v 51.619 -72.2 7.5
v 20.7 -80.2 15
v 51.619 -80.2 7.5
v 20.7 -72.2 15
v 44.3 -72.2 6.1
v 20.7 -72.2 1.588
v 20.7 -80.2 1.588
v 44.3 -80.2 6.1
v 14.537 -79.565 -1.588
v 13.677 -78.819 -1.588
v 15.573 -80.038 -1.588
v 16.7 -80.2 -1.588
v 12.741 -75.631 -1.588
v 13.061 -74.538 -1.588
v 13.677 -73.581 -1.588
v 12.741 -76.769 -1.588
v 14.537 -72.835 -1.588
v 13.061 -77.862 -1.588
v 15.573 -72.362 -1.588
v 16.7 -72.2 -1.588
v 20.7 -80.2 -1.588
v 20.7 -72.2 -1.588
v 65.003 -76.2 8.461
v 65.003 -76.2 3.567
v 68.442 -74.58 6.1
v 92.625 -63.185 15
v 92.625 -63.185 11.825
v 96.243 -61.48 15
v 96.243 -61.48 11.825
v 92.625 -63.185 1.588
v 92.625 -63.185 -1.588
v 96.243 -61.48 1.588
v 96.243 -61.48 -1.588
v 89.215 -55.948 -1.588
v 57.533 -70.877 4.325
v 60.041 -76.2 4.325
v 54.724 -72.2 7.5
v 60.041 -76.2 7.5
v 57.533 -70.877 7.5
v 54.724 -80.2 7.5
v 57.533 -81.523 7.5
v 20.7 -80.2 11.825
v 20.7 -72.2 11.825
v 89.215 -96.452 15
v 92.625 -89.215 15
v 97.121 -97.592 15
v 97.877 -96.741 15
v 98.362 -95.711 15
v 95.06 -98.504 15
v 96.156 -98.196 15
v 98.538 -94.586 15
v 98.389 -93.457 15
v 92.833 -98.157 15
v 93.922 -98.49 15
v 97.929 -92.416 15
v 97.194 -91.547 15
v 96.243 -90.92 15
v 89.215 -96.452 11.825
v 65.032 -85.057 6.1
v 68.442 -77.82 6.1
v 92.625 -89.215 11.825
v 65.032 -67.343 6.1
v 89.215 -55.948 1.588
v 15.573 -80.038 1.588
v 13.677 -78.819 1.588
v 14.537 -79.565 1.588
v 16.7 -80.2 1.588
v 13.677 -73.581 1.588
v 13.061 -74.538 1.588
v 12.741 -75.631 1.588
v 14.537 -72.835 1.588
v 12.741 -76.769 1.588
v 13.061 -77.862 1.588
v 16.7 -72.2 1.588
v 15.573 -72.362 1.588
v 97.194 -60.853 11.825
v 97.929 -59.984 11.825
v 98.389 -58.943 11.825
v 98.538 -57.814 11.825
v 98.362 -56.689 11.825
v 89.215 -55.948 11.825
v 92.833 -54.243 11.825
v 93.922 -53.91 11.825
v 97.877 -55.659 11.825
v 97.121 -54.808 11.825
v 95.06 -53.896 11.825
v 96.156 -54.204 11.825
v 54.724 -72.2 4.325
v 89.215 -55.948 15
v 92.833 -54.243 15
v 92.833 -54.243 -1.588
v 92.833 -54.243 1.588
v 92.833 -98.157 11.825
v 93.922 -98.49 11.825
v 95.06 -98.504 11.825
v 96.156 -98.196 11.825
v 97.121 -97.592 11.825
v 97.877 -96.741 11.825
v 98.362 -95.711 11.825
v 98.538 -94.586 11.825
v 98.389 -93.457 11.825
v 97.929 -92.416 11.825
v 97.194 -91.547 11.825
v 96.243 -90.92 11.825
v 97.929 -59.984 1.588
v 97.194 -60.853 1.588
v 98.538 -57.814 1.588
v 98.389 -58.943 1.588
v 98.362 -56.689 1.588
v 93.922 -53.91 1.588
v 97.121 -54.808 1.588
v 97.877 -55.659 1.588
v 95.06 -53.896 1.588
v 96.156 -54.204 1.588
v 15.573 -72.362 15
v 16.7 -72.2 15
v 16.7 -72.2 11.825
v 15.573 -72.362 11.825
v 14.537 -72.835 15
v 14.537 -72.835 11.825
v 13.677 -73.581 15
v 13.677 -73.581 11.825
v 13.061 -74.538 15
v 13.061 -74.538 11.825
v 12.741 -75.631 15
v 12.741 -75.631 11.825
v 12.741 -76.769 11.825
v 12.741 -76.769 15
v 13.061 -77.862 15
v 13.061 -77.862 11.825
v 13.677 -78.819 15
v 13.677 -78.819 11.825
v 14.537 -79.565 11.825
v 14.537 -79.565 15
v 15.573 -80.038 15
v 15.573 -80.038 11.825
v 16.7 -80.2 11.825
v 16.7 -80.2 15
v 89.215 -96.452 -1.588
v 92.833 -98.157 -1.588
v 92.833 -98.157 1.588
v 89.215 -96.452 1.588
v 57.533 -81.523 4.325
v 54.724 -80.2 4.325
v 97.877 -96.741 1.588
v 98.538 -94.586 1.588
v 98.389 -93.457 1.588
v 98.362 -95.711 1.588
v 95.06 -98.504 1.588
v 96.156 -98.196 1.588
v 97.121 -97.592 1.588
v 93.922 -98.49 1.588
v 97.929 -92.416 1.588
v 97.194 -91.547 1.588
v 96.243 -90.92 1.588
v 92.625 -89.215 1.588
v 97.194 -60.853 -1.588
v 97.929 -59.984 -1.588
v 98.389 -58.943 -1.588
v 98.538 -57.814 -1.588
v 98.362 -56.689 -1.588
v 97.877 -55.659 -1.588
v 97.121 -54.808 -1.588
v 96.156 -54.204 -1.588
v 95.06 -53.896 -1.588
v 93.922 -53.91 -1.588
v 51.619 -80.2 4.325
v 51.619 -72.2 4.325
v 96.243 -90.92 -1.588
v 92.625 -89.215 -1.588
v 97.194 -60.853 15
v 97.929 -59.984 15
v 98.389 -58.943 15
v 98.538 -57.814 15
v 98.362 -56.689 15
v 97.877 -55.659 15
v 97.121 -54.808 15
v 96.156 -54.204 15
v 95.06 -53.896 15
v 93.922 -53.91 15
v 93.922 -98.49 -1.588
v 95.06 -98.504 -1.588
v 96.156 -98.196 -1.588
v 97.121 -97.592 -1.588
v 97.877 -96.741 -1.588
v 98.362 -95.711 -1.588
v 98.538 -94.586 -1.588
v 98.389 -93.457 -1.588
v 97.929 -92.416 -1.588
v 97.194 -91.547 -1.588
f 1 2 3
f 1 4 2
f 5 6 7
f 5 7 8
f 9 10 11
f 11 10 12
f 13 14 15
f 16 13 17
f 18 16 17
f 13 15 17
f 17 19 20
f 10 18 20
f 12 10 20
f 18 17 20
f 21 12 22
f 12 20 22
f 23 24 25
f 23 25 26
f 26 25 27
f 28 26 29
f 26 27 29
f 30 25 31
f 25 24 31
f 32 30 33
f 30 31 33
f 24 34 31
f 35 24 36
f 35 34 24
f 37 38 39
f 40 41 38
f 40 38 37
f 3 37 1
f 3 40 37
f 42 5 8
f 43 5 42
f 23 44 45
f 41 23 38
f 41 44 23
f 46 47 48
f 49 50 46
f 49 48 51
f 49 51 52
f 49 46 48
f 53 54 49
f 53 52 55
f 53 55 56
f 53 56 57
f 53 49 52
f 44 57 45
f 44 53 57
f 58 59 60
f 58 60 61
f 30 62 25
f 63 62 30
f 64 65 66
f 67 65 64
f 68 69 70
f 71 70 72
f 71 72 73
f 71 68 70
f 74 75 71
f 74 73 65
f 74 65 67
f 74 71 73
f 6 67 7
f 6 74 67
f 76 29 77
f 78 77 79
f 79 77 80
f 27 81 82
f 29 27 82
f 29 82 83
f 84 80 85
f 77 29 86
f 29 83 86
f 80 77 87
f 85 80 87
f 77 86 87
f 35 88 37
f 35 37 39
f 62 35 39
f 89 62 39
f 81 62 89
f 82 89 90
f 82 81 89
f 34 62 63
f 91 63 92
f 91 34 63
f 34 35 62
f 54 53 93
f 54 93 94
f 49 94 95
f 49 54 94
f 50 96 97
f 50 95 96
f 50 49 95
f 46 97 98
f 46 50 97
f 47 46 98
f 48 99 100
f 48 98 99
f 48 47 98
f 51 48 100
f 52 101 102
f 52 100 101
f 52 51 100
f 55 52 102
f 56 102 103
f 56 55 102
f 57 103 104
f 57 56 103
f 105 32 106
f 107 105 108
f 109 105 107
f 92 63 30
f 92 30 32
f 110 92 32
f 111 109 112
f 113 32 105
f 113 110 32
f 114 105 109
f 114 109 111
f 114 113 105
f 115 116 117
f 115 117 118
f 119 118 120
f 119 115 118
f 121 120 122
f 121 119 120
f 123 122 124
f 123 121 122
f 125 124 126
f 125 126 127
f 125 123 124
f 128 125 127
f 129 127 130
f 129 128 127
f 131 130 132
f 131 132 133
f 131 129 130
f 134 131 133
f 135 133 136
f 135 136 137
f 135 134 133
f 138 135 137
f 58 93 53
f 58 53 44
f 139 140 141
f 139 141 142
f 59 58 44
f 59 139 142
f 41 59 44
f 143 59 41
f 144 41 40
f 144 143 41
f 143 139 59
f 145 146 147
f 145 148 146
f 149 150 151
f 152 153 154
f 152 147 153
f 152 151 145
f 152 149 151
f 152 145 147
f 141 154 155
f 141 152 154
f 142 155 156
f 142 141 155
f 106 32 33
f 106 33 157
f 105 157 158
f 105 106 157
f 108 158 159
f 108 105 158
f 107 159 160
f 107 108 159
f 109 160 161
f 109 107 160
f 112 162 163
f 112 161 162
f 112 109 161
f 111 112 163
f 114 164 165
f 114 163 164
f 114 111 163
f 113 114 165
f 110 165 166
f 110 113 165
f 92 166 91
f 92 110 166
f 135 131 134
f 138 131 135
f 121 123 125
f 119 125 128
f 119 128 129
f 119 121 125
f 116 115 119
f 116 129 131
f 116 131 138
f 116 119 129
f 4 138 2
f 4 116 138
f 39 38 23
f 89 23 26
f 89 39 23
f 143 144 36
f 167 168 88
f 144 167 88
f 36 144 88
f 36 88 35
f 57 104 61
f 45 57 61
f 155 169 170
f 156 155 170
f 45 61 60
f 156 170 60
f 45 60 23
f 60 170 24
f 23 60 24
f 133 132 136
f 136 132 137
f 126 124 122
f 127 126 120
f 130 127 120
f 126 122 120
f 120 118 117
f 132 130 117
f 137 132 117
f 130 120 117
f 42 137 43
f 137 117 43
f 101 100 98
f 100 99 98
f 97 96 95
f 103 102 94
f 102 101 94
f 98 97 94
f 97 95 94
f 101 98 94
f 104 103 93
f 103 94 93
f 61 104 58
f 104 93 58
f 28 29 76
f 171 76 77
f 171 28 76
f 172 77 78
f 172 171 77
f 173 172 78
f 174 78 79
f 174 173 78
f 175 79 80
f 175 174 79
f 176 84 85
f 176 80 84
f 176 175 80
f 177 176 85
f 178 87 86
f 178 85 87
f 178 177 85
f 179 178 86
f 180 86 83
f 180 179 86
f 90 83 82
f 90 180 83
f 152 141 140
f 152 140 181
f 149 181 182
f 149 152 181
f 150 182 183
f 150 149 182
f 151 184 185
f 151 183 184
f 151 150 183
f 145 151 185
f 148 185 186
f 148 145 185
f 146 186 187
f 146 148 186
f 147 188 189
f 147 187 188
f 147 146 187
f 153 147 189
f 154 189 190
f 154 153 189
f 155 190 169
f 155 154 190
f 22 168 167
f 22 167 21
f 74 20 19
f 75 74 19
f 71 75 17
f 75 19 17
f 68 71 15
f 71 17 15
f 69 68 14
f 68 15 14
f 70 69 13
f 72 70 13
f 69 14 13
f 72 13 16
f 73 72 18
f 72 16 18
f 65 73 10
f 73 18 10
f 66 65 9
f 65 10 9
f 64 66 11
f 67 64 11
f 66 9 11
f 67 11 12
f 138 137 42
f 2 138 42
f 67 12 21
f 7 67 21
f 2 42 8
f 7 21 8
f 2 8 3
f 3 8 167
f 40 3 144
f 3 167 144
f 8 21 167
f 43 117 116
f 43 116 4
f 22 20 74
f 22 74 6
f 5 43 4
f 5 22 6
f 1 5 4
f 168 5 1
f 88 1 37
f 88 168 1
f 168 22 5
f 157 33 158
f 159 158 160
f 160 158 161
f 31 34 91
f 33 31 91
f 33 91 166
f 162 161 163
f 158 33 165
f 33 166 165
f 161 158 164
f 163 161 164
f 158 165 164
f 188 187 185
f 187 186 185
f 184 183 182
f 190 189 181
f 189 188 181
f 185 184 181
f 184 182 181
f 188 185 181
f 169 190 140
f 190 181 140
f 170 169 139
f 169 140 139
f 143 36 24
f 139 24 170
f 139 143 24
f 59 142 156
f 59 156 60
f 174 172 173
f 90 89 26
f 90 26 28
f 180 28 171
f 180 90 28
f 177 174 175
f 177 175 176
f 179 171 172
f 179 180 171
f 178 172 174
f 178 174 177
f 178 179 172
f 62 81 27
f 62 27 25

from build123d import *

# Parameters (mm, degrees)
SKETCH2_R             = 4
BOSS_EXTRUDE1_DEPTH   = 1.5875
BOSS_EXTRUDE1_2_DEPTH = 1.5875
BOSS_EXTRUDE1_3_DEPTH = 1.5875
BOSS_EXTRUDE2_START   = 15
SKETCH2_3_R           = 4
BOSS_EXTRUDE2_DEPTH   = 3.175
BOSS_EXTRUDE2_2_DEPTH = 3.175
BOSS_EXTRUDE2_3_DEPTH = 3.175
BOSS_EXTRUDE3_START   = 7.5
SKETCH2_5_R           = 4
BOSS_EXTRUDE3_DEPTH   = 3.175
BOSS_EXTRUDE5_DEPTH   = 4
BOSS_EXTRUDE6_DEPTH   = 4
BOSS_EXTRUDE8_DEPTH   = 4


with BuildPart() as part:
    # Sketch2 → Boss-Extrude1 (new, symmetric)
    with BuildSketch(Plane.XY):
        with Locations((94.5382, -57.8618)):
            Circle(SKETCH2_R)
    extrude(amount=BOSS_EXTRUDE1_DEPTH, both=True)



with BuildPart() as body_2:
    # Sketch2 → Boss-Extrude1 2 (new, symmetric)
    with BuildSketch(Plane.XY):
        with Locations((16.7, -76.2)):
            Circle(SKETCH2_R)
    extrude(amount=BOSS_EXTRUDE1_2_DEPTH, both=True)



with BuildPart() as body_3:
    # Sketch2 → Boss-Extrude1 3 (new, symmetric)
    with BuildSketch(Plane.XY):
        with Locations((94.5382, -94.5382)):
            Circle(SKETCH2_R)
    extrude(amount=BOSS_EXTRUDE1_3_DEPTH, both=True)


with BuildPart() as body_4:
    # Sketch2<3> → Boss-Extrude2 (new body)
    with BuildSketch(Plane.XY.offset(BOSS_EXTRUDE2_START)):
        with Locations((94.5382, -57.8618)):
            Circle(SKETCH2_3_R)
    extrude(amount=-BOSS_EXTRUDE2_DEPTH)


with BuildPart() as body_5:
    # Sketch2<3> → Boss-Extrude2 2 (new body)
    with BuildSketch(Plane.XY.offset(BOSS_EXTRUDE2_START)):
        with Locations((16.7, -76.2)):
            Circle(SKETCH2_3_R)
    extrude(amount=-BOSS_EXTRUDE2_2_DEPTH)


with BuildPart() as body_6:
    # Sketch2<3> → Boss-Extrude2 3 (new body)
    with BuildSketch(Plane.XY.offset(BOSS_EXTRUDE2_START)):
        with Locations((94.5382, -94.5382)):
            Circle(SKETCH2_3_R)
    extrude(amount=-BOSS_EXTRUDE2_3_DEPTH)


with BuildPart() as body_7:
    # Sketch2<5> → Boss-Extrude3 (new body)
    with BuildSketch(Plane.XY.offset(BOSS_EXTRUDE3_START)):
        with Locations((55.6191, -76.2)):
            Circle(SKETCH2_5_R)
    extrude(amount=-BOSS_EXTRUDE3_DEPTH)


with BuildPart() as body_2_1:
    add(body_2.part)

    add(body_5.part)  # Boss-Extrude5 merges body 5

    add(body_7.part)  # Boss-Extrude5 merges body 7
    # Sketch3 → Boss-Extrude5 (add, symmetric)
    with BuildSketch(Plane(origin=(0, -76.2, 0), x_dir=(1, 0, 0), z_dir=(0, 1, 0))):
        Polygon((51.6191, -4.325), (20.7, 1.5875), (16.7, 1.5875), (16.7, -1.5875), (20.7, -1.5875), (44.299946785, -6.100396086), (20.7, -11.825), (16.7, -11.825), (16.7, -15), (20.7, -15), (51.6191, -7.5), (55.6191, -7.5), (55.6191, -4.325), align=None)
    extrude(amount=BOSS_EXTRUDE5_DEPTH, both=True)


    add(body_3.part)  # Boss-Extrude6 merges body 3

    add(body_6.part)  # Boss-Extrude6 merges body 6
    # Sketch5 → Boss-Extrude6 (add, symmetric)
    with BuildSketch(Plane(origin=(-19.276371181, -40.910177532, 0), x_dir=(-0.9046096798275906, 0.4262409261934197, 0), z_dir=(-0.42624092619341963, -0.9046096798275904, 0))):
        Polygon((-86.793134819, -4.325), (-121.816220762, 1.5875), (-125.816220762, 1.5875), (-125.816220762, -1.5875), (-121.816220762, -1.5875), (-95.083781445, -6.100396086), (-121.816220762, -11.825), (-125.816220762, -11.825), (-125.816220762, -15), (-121.816220762, -15), (-86.793134819, -7.5), (-82.793134819, -7.5), (-82.793134819, -4.325), align=None)
    extrude(amount=BOSS_EXTRUDE6_DEPTH, both=True)


with BuildPart() as part_1:
    add(part.part)

    add(body_2_1.part)  # Boss-Extrude8 merges body 2

    add(body_4.part)  # Boss-Extrude8 merges body 4
    # Sketch7 → Boss-Extrude8 (add, symmetric)
    with BuildSketch(Plane(origin=(39.486274988, -83.801588208, 0), x_dir=(0.9046096798275907, 0.4262409261934195, 0), z_dir=(-0.4262409261934195, 0.9046096798275907, 0))):
        Polygon((30.124664293, -6.100396086), (56.85710361, -1.5875), (60.85710361, -1.5875), (60.85710361, 1.5875), (56.85710361, 1.5875), (21.834017667, -4.325), (17.834017667, -4.325), (17.834017667, -7.5), (21.834017667, -7.5), (56.85710361, -15), (60.85710361, -15), (60.85710361, -11.825), (56.85710361, -11.825), align=None)
    extrude(amount=BOSS_EXTRUDE8_DEPTH, both=True)


solid = part_1.part
